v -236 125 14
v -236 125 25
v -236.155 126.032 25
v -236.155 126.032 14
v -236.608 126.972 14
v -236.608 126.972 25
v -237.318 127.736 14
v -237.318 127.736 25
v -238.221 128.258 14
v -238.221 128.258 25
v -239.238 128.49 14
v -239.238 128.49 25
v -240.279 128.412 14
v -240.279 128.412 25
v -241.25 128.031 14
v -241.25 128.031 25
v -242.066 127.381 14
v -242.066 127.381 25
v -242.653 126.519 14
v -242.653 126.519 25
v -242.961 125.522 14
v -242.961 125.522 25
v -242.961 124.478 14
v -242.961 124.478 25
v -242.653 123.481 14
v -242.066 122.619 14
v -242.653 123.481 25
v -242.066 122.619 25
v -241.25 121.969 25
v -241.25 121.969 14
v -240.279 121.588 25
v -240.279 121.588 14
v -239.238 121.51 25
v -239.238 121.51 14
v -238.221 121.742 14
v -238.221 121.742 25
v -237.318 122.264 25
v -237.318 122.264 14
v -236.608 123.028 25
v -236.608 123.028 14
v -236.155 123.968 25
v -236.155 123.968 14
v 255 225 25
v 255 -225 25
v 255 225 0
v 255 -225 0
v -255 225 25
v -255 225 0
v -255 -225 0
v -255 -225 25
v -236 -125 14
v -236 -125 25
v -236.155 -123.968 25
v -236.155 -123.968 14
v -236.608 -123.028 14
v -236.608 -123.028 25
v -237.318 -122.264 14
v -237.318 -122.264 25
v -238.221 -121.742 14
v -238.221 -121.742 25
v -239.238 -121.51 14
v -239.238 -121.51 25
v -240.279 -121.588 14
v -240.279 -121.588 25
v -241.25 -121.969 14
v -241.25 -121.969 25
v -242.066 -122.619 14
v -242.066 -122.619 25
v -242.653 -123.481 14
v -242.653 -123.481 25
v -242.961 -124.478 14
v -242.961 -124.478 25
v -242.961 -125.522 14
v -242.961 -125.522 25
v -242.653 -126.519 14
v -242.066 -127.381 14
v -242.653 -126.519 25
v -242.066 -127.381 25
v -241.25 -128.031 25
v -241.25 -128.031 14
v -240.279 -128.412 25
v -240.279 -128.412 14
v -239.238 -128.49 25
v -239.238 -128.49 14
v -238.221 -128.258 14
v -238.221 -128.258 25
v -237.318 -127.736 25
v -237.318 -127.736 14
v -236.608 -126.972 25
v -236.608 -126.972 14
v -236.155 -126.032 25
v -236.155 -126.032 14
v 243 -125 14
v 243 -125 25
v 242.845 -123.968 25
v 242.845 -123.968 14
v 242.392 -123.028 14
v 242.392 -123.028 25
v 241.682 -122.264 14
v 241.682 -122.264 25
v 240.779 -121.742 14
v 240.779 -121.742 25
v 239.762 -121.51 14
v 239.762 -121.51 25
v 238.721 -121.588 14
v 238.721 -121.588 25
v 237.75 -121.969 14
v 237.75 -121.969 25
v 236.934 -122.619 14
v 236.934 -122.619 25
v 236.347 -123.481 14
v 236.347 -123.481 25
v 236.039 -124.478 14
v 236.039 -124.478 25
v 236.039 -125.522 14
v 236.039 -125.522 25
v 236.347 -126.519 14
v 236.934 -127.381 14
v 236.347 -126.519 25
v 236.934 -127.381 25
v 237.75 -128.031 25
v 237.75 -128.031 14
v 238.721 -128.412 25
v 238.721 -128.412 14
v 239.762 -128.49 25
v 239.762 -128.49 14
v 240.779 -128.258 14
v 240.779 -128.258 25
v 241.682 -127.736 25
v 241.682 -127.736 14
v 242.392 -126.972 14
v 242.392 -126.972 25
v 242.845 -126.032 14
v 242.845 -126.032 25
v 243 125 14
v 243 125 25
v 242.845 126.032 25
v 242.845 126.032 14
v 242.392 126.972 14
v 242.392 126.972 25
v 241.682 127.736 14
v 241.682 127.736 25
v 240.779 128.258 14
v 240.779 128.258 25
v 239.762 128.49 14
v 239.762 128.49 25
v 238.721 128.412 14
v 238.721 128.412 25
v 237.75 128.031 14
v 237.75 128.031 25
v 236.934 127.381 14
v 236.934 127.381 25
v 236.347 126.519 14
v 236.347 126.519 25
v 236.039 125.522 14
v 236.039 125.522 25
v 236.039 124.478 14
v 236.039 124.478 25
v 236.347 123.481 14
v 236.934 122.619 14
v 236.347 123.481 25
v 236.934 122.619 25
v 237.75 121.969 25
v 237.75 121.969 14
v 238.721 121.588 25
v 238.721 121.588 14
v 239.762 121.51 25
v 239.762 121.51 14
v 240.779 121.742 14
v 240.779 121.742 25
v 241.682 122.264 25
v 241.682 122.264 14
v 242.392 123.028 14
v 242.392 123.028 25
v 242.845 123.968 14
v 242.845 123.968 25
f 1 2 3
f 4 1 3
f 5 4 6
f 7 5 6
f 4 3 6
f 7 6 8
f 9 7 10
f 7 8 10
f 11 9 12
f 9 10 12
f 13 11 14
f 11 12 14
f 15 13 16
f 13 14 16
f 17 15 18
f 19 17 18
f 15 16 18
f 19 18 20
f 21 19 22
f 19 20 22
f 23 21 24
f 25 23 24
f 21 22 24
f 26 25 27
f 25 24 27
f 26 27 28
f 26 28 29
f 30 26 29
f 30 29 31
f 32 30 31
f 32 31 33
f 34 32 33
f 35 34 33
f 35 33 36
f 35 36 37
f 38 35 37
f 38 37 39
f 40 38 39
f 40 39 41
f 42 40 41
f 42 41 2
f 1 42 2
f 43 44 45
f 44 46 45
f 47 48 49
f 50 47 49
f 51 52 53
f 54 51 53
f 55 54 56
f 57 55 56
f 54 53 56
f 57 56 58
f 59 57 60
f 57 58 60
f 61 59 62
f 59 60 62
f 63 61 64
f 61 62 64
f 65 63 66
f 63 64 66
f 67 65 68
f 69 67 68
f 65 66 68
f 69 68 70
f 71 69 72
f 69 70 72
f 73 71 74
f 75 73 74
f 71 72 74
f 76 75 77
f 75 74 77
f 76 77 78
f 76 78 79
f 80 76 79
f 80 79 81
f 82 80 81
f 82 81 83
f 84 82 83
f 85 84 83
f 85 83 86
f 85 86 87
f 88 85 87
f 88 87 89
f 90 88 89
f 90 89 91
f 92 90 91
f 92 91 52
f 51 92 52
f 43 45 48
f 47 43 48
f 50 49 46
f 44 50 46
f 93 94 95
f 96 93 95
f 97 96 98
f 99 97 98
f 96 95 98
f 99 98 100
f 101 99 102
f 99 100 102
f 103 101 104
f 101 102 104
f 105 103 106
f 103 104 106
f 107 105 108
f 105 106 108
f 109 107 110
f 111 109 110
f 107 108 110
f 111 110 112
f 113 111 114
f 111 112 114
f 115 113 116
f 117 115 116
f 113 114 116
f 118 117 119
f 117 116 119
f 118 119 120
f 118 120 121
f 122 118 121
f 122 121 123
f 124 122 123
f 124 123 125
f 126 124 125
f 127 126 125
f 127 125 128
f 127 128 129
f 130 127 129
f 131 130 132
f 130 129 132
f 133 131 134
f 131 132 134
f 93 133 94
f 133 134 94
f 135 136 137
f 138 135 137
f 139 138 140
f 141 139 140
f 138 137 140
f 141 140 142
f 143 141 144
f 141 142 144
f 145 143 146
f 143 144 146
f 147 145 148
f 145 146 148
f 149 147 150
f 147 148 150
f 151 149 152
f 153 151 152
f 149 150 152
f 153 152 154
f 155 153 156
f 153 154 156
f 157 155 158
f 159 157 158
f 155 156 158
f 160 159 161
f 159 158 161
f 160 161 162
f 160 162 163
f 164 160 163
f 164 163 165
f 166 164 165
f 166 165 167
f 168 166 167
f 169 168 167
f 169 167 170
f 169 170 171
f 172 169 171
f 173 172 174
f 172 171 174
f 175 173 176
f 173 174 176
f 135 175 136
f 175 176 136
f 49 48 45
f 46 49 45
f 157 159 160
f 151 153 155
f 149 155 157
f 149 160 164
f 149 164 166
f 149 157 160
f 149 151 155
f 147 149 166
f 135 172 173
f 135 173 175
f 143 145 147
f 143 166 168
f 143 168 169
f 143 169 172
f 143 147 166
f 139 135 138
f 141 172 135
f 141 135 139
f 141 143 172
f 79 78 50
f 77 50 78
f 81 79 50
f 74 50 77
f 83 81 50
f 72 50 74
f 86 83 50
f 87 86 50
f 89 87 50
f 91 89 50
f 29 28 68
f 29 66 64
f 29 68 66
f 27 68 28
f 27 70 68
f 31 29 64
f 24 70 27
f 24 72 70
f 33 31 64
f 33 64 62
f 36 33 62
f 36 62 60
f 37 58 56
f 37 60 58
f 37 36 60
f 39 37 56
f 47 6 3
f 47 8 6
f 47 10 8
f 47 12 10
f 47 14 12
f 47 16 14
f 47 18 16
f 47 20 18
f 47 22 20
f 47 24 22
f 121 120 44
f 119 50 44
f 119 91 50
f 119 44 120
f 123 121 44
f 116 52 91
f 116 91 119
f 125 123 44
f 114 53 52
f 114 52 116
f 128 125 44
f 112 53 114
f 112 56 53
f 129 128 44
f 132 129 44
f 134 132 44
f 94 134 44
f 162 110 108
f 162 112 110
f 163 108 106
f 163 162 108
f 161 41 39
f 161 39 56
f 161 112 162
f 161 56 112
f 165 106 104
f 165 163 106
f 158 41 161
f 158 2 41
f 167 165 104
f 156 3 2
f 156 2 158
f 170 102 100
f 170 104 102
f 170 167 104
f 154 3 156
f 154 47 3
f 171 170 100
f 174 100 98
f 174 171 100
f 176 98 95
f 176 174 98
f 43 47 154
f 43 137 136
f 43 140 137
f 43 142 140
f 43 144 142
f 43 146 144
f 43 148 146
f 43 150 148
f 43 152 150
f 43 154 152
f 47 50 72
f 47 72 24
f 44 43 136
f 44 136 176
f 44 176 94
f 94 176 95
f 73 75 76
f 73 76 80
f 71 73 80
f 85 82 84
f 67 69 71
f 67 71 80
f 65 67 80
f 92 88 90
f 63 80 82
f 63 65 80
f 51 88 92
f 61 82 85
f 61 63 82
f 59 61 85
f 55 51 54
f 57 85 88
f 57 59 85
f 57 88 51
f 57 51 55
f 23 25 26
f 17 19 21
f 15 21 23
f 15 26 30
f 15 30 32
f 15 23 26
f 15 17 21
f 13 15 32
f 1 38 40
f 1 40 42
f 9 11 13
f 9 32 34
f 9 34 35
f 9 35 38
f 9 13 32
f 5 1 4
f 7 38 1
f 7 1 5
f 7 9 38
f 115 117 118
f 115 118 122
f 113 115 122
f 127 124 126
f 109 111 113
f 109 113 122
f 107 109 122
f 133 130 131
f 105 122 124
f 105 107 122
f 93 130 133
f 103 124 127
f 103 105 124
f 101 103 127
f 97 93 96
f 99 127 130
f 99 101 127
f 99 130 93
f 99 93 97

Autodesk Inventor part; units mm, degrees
ref_plane "YZ Plane" through (0, 0, 0) normal (1, 0, 0) x (0, 1, 0)
ref_plane "XZ Plane" through (0, 0, 0) normal (0, 1, 0) x (-1, 0, 0)
ref_plane "XY Plane" through (0, 0, 0) normal (0, 0, 1) x (1, 0, 0)
sketch "Sketch1" plane through (0, 0, 0) normal (0, 0, 1) x (1, 0, 0)
  line L0 (-255, -225) -> (255, -225)
  line L1 (255, -225) -> (255, 225)
  line L2 (255, 225) -> (-255, 225)
  line L3 (-255, 225) -> (-255, -225)
  line L4 (-255, -225) -> (255, 225) construction
  line L5 (255, -225) -> (-255, 225) construction
  point P0 (0, 0)
  dimension "d0" = 510
  dimension "d1" = 450
extrude "Extrusion1" add sketch "Sketch1" along normal blind 25
sketch "Sketch2" plane through (0, 0, 25) normal (0, 0, 1) x (1, 0, 0)
  line L0 (-255, -225) -> (255, -225) construction
  line L1 (255, -225) -> (255, 225) construction
  line L2 (255, 225) -> (-255, 225) construction
  line L3 (-255, 225) -> (-255, -225) construction
  line L4 (255, 225) -> (255, 125) construction
  line L5 (255, -225) -> (255, -125) construction
  line L6 (255, 125) -> (-255, 125) construction
  line L7 (255, -125) -> (-255, -125) construction
  line L8 (0, -125) -> (239.5, -125) construction
  line L9 (0, -125) -> (-239.5, -125) construction
  circle A0 centre (-239.5, -125) radius 3.5
  circle A1 centre (239.5, -125) radius 3.5
  line L10 (0, 125) -> (239.5, 125) construction
  line L11 (0, 125) -> (-239.5, 125) construction
  circle A2 centre (-239.5, 125) radius 3.5
  circle A3 centre (239.5, 125) radius 3.5
  point P0 (0, 0)
  dimension "d4" = 100
  dimension "d5" = 100
  dimension "d6" = 239.5
  dimension "d7" = 239.5
  dimension "d8" = 7
  dimension "d9" = 7
  dimension "d10" = 239.5
  dimension "d11" = 239.5
  dimension "d12" = 7
  dimension "d13" = 7
extrude "Extrusion2" cut sketch "Sketch2" against normal blind 11
properties part number "ed30 panel solar" material "Polycarbonate, Smoke"
